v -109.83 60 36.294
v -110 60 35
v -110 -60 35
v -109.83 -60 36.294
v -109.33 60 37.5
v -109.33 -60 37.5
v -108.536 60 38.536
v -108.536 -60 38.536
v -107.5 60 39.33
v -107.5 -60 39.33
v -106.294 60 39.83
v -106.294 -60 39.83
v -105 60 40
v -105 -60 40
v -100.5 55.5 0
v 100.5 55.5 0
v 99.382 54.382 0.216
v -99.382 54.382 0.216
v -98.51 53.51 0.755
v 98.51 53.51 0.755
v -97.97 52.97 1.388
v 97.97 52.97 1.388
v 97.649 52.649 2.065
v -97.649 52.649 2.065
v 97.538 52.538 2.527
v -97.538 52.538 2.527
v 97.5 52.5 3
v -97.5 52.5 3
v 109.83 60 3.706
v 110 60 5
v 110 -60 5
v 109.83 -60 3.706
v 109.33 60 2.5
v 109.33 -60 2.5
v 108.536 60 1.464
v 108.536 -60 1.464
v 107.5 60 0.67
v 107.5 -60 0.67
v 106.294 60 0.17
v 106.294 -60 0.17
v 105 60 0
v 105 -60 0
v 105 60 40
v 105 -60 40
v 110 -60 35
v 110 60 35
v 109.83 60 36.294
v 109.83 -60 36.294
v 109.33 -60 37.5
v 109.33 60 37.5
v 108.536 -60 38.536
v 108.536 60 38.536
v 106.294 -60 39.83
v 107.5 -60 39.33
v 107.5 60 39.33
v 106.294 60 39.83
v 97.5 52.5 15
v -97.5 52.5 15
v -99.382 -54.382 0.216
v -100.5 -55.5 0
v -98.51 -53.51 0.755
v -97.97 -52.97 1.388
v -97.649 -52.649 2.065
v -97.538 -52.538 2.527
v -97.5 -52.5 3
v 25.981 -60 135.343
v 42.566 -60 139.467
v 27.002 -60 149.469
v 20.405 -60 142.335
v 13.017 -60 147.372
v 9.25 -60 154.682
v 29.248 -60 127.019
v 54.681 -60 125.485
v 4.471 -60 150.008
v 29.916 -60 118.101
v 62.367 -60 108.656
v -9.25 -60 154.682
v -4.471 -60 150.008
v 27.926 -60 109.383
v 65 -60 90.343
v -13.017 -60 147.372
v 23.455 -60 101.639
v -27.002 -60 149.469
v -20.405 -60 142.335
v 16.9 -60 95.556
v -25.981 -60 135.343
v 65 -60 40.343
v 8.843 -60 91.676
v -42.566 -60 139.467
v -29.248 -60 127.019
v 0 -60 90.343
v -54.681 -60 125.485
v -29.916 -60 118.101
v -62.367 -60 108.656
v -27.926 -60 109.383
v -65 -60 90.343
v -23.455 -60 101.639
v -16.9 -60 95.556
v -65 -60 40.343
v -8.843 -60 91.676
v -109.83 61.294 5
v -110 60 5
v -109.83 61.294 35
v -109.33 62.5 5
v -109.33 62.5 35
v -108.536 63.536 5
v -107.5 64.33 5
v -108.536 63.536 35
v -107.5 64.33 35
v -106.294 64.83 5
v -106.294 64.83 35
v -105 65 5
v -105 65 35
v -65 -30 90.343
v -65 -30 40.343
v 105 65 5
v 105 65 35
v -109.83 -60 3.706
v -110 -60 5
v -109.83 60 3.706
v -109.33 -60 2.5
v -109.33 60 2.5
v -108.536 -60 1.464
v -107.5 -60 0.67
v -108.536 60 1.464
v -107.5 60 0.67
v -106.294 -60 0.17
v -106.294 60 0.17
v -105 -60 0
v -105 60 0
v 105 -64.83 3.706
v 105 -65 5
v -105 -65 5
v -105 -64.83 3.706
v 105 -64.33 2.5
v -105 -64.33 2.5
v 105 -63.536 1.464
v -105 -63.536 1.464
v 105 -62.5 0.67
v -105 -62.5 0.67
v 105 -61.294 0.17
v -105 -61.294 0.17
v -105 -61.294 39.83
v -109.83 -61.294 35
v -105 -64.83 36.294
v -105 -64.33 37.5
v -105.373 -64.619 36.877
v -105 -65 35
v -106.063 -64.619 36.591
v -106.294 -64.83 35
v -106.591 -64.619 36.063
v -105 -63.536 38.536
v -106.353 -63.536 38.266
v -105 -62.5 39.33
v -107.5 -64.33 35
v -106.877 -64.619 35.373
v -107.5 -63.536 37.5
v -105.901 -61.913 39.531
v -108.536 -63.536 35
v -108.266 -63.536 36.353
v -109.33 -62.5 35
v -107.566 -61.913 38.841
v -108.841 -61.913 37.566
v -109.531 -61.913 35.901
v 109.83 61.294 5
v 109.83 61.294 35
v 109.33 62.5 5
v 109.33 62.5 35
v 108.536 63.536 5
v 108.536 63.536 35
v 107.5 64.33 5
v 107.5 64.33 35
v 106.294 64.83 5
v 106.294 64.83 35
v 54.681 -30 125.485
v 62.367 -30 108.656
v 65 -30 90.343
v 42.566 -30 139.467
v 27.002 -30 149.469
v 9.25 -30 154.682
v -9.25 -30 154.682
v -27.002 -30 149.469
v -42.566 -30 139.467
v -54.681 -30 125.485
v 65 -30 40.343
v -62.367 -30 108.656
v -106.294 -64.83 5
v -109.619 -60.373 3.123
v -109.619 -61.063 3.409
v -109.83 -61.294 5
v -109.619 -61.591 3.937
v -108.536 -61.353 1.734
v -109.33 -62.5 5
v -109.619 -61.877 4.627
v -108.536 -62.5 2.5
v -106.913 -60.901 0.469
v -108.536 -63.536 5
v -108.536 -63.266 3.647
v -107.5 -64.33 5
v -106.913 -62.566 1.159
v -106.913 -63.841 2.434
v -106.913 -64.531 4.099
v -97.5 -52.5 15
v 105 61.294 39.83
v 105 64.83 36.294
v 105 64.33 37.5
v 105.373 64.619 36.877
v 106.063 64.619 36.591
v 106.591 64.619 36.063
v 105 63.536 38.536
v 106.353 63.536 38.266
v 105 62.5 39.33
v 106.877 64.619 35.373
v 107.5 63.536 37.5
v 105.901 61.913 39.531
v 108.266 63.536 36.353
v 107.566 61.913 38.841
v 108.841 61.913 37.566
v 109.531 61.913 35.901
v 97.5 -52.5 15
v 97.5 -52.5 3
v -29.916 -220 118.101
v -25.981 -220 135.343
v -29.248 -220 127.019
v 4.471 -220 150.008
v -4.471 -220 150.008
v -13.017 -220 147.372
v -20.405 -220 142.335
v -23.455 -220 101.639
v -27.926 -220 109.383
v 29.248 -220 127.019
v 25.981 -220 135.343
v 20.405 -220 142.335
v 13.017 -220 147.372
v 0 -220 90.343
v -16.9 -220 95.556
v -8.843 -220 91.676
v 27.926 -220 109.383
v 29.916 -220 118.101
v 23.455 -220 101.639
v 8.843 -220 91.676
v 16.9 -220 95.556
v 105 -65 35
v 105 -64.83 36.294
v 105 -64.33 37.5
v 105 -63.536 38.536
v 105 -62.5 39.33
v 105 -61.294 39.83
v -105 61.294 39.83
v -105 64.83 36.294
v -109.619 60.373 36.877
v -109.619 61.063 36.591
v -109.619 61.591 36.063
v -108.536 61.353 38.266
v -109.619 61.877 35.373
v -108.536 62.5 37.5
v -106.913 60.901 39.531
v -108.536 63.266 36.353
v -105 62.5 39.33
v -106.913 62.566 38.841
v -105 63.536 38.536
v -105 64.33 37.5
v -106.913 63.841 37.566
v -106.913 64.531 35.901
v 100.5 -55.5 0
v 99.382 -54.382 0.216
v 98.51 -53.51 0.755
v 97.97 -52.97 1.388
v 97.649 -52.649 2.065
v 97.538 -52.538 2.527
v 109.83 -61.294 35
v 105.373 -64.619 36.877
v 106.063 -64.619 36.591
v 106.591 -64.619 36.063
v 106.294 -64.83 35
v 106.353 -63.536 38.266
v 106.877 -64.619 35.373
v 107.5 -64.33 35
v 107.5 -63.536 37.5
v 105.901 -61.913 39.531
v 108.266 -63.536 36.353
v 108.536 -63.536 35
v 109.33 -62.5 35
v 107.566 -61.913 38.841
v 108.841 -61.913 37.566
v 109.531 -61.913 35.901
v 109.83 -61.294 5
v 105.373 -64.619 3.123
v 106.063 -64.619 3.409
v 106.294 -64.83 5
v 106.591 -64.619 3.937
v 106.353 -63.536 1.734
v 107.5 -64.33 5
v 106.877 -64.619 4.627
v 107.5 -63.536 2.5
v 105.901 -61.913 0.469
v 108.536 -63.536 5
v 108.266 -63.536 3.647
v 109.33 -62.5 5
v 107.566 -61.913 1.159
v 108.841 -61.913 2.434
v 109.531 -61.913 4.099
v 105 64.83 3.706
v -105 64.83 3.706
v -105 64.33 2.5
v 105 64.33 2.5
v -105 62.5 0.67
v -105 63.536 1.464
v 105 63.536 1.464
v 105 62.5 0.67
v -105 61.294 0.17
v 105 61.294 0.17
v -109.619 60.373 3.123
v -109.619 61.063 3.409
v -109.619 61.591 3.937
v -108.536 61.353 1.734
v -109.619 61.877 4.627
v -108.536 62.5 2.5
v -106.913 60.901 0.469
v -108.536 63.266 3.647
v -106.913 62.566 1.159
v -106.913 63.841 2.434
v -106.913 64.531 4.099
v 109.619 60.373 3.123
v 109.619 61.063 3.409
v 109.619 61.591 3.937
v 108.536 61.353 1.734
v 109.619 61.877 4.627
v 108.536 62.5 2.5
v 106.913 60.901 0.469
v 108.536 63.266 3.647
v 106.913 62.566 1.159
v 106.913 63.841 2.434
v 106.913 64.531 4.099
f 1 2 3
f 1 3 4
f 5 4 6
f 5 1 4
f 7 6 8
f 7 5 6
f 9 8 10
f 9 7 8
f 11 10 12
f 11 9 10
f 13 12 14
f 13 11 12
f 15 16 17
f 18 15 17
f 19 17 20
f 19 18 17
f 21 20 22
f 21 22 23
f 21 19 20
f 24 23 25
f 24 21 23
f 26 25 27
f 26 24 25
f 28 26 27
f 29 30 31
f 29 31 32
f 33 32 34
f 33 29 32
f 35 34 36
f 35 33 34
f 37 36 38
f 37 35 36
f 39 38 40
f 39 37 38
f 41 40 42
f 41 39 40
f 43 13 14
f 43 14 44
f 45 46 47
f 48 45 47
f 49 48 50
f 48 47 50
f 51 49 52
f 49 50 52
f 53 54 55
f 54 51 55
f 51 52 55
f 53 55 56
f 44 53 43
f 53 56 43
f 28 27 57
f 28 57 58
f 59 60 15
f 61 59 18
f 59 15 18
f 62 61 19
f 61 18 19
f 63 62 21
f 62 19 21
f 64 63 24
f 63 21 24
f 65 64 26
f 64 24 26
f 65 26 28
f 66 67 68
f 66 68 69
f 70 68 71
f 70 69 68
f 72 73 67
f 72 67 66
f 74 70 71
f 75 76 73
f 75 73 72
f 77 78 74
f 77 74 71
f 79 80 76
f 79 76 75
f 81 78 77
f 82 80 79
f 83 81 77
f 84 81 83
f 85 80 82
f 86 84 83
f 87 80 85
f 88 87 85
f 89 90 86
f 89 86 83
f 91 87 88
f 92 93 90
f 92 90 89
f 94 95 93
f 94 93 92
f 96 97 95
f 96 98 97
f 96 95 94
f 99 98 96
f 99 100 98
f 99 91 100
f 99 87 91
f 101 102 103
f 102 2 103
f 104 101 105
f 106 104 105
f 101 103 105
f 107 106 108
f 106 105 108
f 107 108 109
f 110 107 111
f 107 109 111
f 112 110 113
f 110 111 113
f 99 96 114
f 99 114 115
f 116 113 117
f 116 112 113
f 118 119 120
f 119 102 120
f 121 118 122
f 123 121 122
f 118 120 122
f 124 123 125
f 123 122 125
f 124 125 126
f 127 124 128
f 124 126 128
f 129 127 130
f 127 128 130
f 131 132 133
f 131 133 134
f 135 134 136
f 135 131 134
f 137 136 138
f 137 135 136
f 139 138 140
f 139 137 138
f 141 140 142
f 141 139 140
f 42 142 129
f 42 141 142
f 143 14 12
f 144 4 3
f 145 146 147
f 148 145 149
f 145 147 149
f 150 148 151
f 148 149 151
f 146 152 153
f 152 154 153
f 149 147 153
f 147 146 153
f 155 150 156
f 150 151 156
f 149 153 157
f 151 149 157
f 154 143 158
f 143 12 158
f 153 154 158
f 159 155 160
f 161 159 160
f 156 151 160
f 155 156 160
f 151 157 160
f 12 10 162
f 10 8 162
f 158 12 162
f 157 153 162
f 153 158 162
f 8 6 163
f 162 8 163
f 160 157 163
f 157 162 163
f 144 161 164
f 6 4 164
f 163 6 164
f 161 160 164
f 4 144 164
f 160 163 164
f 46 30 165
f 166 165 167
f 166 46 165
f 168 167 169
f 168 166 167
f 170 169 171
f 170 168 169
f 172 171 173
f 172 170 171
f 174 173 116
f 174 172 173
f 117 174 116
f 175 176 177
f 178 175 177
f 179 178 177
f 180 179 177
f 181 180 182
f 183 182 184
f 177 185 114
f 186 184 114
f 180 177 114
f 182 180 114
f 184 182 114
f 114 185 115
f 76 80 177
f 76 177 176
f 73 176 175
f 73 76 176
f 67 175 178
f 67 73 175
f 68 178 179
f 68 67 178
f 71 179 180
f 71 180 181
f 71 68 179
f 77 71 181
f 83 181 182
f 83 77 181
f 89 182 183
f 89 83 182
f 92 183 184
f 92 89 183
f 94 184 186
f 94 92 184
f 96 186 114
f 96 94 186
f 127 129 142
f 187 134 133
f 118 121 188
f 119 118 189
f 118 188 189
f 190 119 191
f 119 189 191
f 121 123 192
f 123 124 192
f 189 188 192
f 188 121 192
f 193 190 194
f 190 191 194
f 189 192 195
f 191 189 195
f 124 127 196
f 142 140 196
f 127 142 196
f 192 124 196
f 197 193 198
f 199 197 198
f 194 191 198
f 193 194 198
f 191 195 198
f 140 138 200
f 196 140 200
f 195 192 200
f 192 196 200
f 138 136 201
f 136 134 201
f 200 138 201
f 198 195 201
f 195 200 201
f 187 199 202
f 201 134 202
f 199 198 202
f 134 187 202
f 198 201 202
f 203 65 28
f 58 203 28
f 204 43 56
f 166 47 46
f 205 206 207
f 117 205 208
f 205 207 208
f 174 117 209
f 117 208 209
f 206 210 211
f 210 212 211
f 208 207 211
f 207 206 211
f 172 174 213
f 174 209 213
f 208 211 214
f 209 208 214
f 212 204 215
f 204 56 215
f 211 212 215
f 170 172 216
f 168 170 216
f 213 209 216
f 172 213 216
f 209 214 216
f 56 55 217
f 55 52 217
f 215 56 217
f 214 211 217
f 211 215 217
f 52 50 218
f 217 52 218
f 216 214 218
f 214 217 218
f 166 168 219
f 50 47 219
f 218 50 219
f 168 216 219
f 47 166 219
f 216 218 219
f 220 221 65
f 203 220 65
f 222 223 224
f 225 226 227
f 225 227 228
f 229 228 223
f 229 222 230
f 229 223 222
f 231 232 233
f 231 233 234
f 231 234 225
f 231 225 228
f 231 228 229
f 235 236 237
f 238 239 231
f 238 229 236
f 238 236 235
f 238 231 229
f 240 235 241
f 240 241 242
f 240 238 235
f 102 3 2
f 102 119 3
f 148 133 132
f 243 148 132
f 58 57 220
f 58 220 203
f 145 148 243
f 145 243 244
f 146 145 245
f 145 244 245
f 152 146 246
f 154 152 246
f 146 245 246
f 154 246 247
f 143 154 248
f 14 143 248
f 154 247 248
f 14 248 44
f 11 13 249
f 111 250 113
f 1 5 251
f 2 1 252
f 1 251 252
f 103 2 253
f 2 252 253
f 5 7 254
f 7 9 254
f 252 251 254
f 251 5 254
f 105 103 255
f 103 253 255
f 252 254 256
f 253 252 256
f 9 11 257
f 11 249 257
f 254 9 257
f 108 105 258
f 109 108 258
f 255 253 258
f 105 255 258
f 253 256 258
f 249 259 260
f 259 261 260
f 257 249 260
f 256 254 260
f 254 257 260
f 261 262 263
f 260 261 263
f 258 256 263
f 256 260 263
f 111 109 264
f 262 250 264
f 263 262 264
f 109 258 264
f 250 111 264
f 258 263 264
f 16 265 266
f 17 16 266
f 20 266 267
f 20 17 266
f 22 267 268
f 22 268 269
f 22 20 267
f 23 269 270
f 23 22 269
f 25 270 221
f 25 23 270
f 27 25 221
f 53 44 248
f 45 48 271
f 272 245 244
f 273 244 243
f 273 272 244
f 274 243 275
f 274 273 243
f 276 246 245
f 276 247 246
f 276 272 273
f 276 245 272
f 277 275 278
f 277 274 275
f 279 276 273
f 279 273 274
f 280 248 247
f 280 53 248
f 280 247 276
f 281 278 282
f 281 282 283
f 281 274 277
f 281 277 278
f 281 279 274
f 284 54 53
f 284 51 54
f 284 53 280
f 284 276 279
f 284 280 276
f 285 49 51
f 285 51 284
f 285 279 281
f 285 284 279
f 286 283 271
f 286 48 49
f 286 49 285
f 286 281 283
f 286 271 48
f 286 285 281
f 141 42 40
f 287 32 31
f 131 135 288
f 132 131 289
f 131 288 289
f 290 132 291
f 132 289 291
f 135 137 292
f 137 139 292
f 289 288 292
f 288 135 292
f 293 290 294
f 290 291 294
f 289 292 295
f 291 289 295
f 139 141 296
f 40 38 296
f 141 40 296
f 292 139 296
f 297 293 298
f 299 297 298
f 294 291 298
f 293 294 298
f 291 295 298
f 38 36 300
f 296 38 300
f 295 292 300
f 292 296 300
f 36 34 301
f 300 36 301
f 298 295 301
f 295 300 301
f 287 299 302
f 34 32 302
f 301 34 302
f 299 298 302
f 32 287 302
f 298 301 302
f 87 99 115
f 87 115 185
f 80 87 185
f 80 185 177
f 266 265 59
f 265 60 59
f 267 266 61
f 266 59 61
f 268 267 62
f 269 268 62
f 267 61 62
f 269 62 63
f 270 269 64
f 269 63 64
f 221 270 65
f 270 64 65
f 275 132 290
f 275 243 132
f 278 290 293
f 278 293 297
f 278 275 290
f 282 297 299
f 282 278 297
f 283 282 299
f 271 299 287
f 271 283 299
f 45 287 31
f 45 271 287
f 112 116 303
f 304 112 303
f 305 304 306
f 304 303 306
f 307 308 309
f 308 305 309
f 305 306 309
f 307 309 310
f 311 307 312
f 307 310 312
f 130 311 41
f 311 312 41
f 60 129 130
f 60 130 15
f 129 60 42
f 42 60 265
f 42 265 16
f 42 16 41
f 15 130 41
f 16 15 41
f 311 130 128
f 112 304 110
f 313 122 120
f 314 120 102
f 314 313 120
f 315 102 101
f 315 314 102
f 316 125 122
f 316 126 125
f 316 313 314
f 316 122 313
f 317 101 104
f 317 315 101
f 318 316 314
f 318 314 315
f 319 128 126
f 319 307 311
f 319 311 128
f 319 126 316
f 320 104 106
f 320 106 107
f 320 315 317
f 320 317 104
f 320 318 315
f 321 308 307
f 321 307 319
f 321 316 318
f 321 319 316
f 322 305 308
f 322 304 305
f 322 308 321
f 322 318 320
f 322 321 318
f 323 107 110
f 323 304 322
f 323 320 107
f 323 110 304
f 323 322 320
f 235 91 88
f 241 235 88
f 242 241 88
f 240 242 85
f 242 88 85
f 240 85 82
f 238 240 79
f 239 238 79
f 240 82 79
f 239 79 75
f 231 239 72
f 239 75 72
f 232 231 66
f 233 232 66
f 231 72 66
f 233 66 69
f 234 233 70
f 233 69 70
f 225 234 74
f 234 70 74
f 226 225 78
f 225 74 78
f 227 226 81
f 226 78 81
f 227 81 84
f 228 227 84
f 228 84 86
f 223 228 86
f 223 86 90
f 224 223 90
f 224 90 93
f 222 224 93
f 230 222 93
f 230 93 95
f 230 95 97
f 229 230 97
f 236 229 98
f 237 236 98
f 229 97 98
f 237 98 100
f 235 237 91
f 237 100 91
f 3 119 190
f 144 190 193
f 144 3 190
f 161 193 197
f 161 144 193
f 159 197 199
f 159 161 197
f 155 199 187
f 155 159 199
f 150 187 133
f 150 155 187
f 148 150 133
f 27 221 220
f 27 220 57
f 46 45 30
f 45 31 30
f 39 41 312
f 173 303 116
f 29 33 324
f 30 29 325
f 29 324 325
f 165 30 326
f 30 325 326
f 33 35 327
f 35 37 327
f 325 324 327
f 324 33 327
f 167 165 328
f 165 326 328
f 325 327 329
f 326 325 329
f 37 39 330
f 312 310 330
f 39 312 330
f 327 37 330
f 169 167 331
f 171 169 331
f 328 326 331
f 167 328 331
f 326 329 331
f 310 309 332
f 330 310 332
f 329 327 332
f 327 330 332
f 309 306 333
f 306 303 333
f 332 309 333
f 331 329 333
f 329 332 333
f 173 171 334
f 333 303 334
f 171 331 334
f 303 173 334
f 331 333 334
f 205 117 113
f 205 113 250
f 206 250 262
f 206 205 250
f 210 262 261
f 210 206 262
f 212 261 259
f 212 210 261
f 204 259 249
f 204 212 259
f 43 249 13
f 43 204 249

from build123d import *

# Parameters (mm, degrees)
SKETCH1_W           = 220
SKETCH1_H           = 130
BOSS_EXTRUDE1_DEPTH = 40
FILLET1_R           = 5
SKETCH2_W           = 195
SKETCH2_H           = 105
CUT_EXTRUDE1_DEPTH  = 15
FILLET2_R           = 3
BOSS_EXTRUDE3_DEPTH = 30
SKETCH7_R           = 30
BOSS_EXTRUDE5_DEPTH = 160


with BuildPart() as part:
    # Sketch1 → Boss-Extrude1 (new body)
    with BuildSketch(Plane.XY):
        Rectangle(SKETCH1_W, SKETCH1_H)
    extrude(amount=BOSS_EXTRUDE1_DEPTH)

    # Fillet1
    fillet1_edges = [part.edges().sort_by_distance(p)[0] for p in [
        (110, 0, 40),
        (0, 65, 40),
        (-110, 0, 40),
        (0, 65, 0),
        (110, 0, 0),
        (0, -65, 0),
        (-110, 0, 0),
        (0, -65, 40),
        (-110, 65, 20),
        (110, 65, 20),
        (110, -65, 20),
        (-110, -65, 20),
    ]]
    fillet(fillet1_edges, radius=FILLET1_R)

    # Sketch2 → Cut-Extrude1 (cut)
    with BuildSketch(Plane(origin=(0, 0, 0), x_dir=(-1, 0, 0), z_dir=(0, 0, -1))):
        Rectangle(SKETCH2_W, SKETCH2_H)
    extrude(amount=-CUT_EXTRUDE1_DEPTH, mode=Mode.SUBTRACT)

    # Fillet2
    fillet2_edges = [part.edges().sort_by_distance(p)[0] for p in [
        (-97.5, 0, 0),
        (0, 52.5, 0),
        (97.5, 0, 0),
        (0, -52.5, 0),
    ]]
    fillet(fillet2_edges, radius=FILLET2_R)


with BuildPart() as body_2:
    # Sketch4 → Boss-Extrude3 (new body)
    with BuildSketch(Plane(origin=(0, -60, 0), x_dir=(1, 0, 0), z_dir=(0, 1, 0))):
        with BuildLine():
            Line((-65, -40.343241832), (65, -40.343241832))
            Line((65, -40.343241832), (65, -90.343241832))
            ThreePointArc((65, -90.343241832), (0, -155.343241832), (-65, -90.343241832))
            Line((-65, -90.343241832), (-65, -40.343241832))
        make_face()
    extrude(amount=BOSS_EXTRUDE3_DEPTH)

    # Sketch7 → Boss-Extrude5 (add)
    with BuildSketch(Plane.XZ.offset(60)):
        with Locations(Location((0, 120.343241832, 0), (0, 0, 270))):
            Circle(SKETCH7_R)
    extrude(amount=BOSS_EXTRUDE5_DEPTH)


solid = Compound([part.part, body_2.part])
